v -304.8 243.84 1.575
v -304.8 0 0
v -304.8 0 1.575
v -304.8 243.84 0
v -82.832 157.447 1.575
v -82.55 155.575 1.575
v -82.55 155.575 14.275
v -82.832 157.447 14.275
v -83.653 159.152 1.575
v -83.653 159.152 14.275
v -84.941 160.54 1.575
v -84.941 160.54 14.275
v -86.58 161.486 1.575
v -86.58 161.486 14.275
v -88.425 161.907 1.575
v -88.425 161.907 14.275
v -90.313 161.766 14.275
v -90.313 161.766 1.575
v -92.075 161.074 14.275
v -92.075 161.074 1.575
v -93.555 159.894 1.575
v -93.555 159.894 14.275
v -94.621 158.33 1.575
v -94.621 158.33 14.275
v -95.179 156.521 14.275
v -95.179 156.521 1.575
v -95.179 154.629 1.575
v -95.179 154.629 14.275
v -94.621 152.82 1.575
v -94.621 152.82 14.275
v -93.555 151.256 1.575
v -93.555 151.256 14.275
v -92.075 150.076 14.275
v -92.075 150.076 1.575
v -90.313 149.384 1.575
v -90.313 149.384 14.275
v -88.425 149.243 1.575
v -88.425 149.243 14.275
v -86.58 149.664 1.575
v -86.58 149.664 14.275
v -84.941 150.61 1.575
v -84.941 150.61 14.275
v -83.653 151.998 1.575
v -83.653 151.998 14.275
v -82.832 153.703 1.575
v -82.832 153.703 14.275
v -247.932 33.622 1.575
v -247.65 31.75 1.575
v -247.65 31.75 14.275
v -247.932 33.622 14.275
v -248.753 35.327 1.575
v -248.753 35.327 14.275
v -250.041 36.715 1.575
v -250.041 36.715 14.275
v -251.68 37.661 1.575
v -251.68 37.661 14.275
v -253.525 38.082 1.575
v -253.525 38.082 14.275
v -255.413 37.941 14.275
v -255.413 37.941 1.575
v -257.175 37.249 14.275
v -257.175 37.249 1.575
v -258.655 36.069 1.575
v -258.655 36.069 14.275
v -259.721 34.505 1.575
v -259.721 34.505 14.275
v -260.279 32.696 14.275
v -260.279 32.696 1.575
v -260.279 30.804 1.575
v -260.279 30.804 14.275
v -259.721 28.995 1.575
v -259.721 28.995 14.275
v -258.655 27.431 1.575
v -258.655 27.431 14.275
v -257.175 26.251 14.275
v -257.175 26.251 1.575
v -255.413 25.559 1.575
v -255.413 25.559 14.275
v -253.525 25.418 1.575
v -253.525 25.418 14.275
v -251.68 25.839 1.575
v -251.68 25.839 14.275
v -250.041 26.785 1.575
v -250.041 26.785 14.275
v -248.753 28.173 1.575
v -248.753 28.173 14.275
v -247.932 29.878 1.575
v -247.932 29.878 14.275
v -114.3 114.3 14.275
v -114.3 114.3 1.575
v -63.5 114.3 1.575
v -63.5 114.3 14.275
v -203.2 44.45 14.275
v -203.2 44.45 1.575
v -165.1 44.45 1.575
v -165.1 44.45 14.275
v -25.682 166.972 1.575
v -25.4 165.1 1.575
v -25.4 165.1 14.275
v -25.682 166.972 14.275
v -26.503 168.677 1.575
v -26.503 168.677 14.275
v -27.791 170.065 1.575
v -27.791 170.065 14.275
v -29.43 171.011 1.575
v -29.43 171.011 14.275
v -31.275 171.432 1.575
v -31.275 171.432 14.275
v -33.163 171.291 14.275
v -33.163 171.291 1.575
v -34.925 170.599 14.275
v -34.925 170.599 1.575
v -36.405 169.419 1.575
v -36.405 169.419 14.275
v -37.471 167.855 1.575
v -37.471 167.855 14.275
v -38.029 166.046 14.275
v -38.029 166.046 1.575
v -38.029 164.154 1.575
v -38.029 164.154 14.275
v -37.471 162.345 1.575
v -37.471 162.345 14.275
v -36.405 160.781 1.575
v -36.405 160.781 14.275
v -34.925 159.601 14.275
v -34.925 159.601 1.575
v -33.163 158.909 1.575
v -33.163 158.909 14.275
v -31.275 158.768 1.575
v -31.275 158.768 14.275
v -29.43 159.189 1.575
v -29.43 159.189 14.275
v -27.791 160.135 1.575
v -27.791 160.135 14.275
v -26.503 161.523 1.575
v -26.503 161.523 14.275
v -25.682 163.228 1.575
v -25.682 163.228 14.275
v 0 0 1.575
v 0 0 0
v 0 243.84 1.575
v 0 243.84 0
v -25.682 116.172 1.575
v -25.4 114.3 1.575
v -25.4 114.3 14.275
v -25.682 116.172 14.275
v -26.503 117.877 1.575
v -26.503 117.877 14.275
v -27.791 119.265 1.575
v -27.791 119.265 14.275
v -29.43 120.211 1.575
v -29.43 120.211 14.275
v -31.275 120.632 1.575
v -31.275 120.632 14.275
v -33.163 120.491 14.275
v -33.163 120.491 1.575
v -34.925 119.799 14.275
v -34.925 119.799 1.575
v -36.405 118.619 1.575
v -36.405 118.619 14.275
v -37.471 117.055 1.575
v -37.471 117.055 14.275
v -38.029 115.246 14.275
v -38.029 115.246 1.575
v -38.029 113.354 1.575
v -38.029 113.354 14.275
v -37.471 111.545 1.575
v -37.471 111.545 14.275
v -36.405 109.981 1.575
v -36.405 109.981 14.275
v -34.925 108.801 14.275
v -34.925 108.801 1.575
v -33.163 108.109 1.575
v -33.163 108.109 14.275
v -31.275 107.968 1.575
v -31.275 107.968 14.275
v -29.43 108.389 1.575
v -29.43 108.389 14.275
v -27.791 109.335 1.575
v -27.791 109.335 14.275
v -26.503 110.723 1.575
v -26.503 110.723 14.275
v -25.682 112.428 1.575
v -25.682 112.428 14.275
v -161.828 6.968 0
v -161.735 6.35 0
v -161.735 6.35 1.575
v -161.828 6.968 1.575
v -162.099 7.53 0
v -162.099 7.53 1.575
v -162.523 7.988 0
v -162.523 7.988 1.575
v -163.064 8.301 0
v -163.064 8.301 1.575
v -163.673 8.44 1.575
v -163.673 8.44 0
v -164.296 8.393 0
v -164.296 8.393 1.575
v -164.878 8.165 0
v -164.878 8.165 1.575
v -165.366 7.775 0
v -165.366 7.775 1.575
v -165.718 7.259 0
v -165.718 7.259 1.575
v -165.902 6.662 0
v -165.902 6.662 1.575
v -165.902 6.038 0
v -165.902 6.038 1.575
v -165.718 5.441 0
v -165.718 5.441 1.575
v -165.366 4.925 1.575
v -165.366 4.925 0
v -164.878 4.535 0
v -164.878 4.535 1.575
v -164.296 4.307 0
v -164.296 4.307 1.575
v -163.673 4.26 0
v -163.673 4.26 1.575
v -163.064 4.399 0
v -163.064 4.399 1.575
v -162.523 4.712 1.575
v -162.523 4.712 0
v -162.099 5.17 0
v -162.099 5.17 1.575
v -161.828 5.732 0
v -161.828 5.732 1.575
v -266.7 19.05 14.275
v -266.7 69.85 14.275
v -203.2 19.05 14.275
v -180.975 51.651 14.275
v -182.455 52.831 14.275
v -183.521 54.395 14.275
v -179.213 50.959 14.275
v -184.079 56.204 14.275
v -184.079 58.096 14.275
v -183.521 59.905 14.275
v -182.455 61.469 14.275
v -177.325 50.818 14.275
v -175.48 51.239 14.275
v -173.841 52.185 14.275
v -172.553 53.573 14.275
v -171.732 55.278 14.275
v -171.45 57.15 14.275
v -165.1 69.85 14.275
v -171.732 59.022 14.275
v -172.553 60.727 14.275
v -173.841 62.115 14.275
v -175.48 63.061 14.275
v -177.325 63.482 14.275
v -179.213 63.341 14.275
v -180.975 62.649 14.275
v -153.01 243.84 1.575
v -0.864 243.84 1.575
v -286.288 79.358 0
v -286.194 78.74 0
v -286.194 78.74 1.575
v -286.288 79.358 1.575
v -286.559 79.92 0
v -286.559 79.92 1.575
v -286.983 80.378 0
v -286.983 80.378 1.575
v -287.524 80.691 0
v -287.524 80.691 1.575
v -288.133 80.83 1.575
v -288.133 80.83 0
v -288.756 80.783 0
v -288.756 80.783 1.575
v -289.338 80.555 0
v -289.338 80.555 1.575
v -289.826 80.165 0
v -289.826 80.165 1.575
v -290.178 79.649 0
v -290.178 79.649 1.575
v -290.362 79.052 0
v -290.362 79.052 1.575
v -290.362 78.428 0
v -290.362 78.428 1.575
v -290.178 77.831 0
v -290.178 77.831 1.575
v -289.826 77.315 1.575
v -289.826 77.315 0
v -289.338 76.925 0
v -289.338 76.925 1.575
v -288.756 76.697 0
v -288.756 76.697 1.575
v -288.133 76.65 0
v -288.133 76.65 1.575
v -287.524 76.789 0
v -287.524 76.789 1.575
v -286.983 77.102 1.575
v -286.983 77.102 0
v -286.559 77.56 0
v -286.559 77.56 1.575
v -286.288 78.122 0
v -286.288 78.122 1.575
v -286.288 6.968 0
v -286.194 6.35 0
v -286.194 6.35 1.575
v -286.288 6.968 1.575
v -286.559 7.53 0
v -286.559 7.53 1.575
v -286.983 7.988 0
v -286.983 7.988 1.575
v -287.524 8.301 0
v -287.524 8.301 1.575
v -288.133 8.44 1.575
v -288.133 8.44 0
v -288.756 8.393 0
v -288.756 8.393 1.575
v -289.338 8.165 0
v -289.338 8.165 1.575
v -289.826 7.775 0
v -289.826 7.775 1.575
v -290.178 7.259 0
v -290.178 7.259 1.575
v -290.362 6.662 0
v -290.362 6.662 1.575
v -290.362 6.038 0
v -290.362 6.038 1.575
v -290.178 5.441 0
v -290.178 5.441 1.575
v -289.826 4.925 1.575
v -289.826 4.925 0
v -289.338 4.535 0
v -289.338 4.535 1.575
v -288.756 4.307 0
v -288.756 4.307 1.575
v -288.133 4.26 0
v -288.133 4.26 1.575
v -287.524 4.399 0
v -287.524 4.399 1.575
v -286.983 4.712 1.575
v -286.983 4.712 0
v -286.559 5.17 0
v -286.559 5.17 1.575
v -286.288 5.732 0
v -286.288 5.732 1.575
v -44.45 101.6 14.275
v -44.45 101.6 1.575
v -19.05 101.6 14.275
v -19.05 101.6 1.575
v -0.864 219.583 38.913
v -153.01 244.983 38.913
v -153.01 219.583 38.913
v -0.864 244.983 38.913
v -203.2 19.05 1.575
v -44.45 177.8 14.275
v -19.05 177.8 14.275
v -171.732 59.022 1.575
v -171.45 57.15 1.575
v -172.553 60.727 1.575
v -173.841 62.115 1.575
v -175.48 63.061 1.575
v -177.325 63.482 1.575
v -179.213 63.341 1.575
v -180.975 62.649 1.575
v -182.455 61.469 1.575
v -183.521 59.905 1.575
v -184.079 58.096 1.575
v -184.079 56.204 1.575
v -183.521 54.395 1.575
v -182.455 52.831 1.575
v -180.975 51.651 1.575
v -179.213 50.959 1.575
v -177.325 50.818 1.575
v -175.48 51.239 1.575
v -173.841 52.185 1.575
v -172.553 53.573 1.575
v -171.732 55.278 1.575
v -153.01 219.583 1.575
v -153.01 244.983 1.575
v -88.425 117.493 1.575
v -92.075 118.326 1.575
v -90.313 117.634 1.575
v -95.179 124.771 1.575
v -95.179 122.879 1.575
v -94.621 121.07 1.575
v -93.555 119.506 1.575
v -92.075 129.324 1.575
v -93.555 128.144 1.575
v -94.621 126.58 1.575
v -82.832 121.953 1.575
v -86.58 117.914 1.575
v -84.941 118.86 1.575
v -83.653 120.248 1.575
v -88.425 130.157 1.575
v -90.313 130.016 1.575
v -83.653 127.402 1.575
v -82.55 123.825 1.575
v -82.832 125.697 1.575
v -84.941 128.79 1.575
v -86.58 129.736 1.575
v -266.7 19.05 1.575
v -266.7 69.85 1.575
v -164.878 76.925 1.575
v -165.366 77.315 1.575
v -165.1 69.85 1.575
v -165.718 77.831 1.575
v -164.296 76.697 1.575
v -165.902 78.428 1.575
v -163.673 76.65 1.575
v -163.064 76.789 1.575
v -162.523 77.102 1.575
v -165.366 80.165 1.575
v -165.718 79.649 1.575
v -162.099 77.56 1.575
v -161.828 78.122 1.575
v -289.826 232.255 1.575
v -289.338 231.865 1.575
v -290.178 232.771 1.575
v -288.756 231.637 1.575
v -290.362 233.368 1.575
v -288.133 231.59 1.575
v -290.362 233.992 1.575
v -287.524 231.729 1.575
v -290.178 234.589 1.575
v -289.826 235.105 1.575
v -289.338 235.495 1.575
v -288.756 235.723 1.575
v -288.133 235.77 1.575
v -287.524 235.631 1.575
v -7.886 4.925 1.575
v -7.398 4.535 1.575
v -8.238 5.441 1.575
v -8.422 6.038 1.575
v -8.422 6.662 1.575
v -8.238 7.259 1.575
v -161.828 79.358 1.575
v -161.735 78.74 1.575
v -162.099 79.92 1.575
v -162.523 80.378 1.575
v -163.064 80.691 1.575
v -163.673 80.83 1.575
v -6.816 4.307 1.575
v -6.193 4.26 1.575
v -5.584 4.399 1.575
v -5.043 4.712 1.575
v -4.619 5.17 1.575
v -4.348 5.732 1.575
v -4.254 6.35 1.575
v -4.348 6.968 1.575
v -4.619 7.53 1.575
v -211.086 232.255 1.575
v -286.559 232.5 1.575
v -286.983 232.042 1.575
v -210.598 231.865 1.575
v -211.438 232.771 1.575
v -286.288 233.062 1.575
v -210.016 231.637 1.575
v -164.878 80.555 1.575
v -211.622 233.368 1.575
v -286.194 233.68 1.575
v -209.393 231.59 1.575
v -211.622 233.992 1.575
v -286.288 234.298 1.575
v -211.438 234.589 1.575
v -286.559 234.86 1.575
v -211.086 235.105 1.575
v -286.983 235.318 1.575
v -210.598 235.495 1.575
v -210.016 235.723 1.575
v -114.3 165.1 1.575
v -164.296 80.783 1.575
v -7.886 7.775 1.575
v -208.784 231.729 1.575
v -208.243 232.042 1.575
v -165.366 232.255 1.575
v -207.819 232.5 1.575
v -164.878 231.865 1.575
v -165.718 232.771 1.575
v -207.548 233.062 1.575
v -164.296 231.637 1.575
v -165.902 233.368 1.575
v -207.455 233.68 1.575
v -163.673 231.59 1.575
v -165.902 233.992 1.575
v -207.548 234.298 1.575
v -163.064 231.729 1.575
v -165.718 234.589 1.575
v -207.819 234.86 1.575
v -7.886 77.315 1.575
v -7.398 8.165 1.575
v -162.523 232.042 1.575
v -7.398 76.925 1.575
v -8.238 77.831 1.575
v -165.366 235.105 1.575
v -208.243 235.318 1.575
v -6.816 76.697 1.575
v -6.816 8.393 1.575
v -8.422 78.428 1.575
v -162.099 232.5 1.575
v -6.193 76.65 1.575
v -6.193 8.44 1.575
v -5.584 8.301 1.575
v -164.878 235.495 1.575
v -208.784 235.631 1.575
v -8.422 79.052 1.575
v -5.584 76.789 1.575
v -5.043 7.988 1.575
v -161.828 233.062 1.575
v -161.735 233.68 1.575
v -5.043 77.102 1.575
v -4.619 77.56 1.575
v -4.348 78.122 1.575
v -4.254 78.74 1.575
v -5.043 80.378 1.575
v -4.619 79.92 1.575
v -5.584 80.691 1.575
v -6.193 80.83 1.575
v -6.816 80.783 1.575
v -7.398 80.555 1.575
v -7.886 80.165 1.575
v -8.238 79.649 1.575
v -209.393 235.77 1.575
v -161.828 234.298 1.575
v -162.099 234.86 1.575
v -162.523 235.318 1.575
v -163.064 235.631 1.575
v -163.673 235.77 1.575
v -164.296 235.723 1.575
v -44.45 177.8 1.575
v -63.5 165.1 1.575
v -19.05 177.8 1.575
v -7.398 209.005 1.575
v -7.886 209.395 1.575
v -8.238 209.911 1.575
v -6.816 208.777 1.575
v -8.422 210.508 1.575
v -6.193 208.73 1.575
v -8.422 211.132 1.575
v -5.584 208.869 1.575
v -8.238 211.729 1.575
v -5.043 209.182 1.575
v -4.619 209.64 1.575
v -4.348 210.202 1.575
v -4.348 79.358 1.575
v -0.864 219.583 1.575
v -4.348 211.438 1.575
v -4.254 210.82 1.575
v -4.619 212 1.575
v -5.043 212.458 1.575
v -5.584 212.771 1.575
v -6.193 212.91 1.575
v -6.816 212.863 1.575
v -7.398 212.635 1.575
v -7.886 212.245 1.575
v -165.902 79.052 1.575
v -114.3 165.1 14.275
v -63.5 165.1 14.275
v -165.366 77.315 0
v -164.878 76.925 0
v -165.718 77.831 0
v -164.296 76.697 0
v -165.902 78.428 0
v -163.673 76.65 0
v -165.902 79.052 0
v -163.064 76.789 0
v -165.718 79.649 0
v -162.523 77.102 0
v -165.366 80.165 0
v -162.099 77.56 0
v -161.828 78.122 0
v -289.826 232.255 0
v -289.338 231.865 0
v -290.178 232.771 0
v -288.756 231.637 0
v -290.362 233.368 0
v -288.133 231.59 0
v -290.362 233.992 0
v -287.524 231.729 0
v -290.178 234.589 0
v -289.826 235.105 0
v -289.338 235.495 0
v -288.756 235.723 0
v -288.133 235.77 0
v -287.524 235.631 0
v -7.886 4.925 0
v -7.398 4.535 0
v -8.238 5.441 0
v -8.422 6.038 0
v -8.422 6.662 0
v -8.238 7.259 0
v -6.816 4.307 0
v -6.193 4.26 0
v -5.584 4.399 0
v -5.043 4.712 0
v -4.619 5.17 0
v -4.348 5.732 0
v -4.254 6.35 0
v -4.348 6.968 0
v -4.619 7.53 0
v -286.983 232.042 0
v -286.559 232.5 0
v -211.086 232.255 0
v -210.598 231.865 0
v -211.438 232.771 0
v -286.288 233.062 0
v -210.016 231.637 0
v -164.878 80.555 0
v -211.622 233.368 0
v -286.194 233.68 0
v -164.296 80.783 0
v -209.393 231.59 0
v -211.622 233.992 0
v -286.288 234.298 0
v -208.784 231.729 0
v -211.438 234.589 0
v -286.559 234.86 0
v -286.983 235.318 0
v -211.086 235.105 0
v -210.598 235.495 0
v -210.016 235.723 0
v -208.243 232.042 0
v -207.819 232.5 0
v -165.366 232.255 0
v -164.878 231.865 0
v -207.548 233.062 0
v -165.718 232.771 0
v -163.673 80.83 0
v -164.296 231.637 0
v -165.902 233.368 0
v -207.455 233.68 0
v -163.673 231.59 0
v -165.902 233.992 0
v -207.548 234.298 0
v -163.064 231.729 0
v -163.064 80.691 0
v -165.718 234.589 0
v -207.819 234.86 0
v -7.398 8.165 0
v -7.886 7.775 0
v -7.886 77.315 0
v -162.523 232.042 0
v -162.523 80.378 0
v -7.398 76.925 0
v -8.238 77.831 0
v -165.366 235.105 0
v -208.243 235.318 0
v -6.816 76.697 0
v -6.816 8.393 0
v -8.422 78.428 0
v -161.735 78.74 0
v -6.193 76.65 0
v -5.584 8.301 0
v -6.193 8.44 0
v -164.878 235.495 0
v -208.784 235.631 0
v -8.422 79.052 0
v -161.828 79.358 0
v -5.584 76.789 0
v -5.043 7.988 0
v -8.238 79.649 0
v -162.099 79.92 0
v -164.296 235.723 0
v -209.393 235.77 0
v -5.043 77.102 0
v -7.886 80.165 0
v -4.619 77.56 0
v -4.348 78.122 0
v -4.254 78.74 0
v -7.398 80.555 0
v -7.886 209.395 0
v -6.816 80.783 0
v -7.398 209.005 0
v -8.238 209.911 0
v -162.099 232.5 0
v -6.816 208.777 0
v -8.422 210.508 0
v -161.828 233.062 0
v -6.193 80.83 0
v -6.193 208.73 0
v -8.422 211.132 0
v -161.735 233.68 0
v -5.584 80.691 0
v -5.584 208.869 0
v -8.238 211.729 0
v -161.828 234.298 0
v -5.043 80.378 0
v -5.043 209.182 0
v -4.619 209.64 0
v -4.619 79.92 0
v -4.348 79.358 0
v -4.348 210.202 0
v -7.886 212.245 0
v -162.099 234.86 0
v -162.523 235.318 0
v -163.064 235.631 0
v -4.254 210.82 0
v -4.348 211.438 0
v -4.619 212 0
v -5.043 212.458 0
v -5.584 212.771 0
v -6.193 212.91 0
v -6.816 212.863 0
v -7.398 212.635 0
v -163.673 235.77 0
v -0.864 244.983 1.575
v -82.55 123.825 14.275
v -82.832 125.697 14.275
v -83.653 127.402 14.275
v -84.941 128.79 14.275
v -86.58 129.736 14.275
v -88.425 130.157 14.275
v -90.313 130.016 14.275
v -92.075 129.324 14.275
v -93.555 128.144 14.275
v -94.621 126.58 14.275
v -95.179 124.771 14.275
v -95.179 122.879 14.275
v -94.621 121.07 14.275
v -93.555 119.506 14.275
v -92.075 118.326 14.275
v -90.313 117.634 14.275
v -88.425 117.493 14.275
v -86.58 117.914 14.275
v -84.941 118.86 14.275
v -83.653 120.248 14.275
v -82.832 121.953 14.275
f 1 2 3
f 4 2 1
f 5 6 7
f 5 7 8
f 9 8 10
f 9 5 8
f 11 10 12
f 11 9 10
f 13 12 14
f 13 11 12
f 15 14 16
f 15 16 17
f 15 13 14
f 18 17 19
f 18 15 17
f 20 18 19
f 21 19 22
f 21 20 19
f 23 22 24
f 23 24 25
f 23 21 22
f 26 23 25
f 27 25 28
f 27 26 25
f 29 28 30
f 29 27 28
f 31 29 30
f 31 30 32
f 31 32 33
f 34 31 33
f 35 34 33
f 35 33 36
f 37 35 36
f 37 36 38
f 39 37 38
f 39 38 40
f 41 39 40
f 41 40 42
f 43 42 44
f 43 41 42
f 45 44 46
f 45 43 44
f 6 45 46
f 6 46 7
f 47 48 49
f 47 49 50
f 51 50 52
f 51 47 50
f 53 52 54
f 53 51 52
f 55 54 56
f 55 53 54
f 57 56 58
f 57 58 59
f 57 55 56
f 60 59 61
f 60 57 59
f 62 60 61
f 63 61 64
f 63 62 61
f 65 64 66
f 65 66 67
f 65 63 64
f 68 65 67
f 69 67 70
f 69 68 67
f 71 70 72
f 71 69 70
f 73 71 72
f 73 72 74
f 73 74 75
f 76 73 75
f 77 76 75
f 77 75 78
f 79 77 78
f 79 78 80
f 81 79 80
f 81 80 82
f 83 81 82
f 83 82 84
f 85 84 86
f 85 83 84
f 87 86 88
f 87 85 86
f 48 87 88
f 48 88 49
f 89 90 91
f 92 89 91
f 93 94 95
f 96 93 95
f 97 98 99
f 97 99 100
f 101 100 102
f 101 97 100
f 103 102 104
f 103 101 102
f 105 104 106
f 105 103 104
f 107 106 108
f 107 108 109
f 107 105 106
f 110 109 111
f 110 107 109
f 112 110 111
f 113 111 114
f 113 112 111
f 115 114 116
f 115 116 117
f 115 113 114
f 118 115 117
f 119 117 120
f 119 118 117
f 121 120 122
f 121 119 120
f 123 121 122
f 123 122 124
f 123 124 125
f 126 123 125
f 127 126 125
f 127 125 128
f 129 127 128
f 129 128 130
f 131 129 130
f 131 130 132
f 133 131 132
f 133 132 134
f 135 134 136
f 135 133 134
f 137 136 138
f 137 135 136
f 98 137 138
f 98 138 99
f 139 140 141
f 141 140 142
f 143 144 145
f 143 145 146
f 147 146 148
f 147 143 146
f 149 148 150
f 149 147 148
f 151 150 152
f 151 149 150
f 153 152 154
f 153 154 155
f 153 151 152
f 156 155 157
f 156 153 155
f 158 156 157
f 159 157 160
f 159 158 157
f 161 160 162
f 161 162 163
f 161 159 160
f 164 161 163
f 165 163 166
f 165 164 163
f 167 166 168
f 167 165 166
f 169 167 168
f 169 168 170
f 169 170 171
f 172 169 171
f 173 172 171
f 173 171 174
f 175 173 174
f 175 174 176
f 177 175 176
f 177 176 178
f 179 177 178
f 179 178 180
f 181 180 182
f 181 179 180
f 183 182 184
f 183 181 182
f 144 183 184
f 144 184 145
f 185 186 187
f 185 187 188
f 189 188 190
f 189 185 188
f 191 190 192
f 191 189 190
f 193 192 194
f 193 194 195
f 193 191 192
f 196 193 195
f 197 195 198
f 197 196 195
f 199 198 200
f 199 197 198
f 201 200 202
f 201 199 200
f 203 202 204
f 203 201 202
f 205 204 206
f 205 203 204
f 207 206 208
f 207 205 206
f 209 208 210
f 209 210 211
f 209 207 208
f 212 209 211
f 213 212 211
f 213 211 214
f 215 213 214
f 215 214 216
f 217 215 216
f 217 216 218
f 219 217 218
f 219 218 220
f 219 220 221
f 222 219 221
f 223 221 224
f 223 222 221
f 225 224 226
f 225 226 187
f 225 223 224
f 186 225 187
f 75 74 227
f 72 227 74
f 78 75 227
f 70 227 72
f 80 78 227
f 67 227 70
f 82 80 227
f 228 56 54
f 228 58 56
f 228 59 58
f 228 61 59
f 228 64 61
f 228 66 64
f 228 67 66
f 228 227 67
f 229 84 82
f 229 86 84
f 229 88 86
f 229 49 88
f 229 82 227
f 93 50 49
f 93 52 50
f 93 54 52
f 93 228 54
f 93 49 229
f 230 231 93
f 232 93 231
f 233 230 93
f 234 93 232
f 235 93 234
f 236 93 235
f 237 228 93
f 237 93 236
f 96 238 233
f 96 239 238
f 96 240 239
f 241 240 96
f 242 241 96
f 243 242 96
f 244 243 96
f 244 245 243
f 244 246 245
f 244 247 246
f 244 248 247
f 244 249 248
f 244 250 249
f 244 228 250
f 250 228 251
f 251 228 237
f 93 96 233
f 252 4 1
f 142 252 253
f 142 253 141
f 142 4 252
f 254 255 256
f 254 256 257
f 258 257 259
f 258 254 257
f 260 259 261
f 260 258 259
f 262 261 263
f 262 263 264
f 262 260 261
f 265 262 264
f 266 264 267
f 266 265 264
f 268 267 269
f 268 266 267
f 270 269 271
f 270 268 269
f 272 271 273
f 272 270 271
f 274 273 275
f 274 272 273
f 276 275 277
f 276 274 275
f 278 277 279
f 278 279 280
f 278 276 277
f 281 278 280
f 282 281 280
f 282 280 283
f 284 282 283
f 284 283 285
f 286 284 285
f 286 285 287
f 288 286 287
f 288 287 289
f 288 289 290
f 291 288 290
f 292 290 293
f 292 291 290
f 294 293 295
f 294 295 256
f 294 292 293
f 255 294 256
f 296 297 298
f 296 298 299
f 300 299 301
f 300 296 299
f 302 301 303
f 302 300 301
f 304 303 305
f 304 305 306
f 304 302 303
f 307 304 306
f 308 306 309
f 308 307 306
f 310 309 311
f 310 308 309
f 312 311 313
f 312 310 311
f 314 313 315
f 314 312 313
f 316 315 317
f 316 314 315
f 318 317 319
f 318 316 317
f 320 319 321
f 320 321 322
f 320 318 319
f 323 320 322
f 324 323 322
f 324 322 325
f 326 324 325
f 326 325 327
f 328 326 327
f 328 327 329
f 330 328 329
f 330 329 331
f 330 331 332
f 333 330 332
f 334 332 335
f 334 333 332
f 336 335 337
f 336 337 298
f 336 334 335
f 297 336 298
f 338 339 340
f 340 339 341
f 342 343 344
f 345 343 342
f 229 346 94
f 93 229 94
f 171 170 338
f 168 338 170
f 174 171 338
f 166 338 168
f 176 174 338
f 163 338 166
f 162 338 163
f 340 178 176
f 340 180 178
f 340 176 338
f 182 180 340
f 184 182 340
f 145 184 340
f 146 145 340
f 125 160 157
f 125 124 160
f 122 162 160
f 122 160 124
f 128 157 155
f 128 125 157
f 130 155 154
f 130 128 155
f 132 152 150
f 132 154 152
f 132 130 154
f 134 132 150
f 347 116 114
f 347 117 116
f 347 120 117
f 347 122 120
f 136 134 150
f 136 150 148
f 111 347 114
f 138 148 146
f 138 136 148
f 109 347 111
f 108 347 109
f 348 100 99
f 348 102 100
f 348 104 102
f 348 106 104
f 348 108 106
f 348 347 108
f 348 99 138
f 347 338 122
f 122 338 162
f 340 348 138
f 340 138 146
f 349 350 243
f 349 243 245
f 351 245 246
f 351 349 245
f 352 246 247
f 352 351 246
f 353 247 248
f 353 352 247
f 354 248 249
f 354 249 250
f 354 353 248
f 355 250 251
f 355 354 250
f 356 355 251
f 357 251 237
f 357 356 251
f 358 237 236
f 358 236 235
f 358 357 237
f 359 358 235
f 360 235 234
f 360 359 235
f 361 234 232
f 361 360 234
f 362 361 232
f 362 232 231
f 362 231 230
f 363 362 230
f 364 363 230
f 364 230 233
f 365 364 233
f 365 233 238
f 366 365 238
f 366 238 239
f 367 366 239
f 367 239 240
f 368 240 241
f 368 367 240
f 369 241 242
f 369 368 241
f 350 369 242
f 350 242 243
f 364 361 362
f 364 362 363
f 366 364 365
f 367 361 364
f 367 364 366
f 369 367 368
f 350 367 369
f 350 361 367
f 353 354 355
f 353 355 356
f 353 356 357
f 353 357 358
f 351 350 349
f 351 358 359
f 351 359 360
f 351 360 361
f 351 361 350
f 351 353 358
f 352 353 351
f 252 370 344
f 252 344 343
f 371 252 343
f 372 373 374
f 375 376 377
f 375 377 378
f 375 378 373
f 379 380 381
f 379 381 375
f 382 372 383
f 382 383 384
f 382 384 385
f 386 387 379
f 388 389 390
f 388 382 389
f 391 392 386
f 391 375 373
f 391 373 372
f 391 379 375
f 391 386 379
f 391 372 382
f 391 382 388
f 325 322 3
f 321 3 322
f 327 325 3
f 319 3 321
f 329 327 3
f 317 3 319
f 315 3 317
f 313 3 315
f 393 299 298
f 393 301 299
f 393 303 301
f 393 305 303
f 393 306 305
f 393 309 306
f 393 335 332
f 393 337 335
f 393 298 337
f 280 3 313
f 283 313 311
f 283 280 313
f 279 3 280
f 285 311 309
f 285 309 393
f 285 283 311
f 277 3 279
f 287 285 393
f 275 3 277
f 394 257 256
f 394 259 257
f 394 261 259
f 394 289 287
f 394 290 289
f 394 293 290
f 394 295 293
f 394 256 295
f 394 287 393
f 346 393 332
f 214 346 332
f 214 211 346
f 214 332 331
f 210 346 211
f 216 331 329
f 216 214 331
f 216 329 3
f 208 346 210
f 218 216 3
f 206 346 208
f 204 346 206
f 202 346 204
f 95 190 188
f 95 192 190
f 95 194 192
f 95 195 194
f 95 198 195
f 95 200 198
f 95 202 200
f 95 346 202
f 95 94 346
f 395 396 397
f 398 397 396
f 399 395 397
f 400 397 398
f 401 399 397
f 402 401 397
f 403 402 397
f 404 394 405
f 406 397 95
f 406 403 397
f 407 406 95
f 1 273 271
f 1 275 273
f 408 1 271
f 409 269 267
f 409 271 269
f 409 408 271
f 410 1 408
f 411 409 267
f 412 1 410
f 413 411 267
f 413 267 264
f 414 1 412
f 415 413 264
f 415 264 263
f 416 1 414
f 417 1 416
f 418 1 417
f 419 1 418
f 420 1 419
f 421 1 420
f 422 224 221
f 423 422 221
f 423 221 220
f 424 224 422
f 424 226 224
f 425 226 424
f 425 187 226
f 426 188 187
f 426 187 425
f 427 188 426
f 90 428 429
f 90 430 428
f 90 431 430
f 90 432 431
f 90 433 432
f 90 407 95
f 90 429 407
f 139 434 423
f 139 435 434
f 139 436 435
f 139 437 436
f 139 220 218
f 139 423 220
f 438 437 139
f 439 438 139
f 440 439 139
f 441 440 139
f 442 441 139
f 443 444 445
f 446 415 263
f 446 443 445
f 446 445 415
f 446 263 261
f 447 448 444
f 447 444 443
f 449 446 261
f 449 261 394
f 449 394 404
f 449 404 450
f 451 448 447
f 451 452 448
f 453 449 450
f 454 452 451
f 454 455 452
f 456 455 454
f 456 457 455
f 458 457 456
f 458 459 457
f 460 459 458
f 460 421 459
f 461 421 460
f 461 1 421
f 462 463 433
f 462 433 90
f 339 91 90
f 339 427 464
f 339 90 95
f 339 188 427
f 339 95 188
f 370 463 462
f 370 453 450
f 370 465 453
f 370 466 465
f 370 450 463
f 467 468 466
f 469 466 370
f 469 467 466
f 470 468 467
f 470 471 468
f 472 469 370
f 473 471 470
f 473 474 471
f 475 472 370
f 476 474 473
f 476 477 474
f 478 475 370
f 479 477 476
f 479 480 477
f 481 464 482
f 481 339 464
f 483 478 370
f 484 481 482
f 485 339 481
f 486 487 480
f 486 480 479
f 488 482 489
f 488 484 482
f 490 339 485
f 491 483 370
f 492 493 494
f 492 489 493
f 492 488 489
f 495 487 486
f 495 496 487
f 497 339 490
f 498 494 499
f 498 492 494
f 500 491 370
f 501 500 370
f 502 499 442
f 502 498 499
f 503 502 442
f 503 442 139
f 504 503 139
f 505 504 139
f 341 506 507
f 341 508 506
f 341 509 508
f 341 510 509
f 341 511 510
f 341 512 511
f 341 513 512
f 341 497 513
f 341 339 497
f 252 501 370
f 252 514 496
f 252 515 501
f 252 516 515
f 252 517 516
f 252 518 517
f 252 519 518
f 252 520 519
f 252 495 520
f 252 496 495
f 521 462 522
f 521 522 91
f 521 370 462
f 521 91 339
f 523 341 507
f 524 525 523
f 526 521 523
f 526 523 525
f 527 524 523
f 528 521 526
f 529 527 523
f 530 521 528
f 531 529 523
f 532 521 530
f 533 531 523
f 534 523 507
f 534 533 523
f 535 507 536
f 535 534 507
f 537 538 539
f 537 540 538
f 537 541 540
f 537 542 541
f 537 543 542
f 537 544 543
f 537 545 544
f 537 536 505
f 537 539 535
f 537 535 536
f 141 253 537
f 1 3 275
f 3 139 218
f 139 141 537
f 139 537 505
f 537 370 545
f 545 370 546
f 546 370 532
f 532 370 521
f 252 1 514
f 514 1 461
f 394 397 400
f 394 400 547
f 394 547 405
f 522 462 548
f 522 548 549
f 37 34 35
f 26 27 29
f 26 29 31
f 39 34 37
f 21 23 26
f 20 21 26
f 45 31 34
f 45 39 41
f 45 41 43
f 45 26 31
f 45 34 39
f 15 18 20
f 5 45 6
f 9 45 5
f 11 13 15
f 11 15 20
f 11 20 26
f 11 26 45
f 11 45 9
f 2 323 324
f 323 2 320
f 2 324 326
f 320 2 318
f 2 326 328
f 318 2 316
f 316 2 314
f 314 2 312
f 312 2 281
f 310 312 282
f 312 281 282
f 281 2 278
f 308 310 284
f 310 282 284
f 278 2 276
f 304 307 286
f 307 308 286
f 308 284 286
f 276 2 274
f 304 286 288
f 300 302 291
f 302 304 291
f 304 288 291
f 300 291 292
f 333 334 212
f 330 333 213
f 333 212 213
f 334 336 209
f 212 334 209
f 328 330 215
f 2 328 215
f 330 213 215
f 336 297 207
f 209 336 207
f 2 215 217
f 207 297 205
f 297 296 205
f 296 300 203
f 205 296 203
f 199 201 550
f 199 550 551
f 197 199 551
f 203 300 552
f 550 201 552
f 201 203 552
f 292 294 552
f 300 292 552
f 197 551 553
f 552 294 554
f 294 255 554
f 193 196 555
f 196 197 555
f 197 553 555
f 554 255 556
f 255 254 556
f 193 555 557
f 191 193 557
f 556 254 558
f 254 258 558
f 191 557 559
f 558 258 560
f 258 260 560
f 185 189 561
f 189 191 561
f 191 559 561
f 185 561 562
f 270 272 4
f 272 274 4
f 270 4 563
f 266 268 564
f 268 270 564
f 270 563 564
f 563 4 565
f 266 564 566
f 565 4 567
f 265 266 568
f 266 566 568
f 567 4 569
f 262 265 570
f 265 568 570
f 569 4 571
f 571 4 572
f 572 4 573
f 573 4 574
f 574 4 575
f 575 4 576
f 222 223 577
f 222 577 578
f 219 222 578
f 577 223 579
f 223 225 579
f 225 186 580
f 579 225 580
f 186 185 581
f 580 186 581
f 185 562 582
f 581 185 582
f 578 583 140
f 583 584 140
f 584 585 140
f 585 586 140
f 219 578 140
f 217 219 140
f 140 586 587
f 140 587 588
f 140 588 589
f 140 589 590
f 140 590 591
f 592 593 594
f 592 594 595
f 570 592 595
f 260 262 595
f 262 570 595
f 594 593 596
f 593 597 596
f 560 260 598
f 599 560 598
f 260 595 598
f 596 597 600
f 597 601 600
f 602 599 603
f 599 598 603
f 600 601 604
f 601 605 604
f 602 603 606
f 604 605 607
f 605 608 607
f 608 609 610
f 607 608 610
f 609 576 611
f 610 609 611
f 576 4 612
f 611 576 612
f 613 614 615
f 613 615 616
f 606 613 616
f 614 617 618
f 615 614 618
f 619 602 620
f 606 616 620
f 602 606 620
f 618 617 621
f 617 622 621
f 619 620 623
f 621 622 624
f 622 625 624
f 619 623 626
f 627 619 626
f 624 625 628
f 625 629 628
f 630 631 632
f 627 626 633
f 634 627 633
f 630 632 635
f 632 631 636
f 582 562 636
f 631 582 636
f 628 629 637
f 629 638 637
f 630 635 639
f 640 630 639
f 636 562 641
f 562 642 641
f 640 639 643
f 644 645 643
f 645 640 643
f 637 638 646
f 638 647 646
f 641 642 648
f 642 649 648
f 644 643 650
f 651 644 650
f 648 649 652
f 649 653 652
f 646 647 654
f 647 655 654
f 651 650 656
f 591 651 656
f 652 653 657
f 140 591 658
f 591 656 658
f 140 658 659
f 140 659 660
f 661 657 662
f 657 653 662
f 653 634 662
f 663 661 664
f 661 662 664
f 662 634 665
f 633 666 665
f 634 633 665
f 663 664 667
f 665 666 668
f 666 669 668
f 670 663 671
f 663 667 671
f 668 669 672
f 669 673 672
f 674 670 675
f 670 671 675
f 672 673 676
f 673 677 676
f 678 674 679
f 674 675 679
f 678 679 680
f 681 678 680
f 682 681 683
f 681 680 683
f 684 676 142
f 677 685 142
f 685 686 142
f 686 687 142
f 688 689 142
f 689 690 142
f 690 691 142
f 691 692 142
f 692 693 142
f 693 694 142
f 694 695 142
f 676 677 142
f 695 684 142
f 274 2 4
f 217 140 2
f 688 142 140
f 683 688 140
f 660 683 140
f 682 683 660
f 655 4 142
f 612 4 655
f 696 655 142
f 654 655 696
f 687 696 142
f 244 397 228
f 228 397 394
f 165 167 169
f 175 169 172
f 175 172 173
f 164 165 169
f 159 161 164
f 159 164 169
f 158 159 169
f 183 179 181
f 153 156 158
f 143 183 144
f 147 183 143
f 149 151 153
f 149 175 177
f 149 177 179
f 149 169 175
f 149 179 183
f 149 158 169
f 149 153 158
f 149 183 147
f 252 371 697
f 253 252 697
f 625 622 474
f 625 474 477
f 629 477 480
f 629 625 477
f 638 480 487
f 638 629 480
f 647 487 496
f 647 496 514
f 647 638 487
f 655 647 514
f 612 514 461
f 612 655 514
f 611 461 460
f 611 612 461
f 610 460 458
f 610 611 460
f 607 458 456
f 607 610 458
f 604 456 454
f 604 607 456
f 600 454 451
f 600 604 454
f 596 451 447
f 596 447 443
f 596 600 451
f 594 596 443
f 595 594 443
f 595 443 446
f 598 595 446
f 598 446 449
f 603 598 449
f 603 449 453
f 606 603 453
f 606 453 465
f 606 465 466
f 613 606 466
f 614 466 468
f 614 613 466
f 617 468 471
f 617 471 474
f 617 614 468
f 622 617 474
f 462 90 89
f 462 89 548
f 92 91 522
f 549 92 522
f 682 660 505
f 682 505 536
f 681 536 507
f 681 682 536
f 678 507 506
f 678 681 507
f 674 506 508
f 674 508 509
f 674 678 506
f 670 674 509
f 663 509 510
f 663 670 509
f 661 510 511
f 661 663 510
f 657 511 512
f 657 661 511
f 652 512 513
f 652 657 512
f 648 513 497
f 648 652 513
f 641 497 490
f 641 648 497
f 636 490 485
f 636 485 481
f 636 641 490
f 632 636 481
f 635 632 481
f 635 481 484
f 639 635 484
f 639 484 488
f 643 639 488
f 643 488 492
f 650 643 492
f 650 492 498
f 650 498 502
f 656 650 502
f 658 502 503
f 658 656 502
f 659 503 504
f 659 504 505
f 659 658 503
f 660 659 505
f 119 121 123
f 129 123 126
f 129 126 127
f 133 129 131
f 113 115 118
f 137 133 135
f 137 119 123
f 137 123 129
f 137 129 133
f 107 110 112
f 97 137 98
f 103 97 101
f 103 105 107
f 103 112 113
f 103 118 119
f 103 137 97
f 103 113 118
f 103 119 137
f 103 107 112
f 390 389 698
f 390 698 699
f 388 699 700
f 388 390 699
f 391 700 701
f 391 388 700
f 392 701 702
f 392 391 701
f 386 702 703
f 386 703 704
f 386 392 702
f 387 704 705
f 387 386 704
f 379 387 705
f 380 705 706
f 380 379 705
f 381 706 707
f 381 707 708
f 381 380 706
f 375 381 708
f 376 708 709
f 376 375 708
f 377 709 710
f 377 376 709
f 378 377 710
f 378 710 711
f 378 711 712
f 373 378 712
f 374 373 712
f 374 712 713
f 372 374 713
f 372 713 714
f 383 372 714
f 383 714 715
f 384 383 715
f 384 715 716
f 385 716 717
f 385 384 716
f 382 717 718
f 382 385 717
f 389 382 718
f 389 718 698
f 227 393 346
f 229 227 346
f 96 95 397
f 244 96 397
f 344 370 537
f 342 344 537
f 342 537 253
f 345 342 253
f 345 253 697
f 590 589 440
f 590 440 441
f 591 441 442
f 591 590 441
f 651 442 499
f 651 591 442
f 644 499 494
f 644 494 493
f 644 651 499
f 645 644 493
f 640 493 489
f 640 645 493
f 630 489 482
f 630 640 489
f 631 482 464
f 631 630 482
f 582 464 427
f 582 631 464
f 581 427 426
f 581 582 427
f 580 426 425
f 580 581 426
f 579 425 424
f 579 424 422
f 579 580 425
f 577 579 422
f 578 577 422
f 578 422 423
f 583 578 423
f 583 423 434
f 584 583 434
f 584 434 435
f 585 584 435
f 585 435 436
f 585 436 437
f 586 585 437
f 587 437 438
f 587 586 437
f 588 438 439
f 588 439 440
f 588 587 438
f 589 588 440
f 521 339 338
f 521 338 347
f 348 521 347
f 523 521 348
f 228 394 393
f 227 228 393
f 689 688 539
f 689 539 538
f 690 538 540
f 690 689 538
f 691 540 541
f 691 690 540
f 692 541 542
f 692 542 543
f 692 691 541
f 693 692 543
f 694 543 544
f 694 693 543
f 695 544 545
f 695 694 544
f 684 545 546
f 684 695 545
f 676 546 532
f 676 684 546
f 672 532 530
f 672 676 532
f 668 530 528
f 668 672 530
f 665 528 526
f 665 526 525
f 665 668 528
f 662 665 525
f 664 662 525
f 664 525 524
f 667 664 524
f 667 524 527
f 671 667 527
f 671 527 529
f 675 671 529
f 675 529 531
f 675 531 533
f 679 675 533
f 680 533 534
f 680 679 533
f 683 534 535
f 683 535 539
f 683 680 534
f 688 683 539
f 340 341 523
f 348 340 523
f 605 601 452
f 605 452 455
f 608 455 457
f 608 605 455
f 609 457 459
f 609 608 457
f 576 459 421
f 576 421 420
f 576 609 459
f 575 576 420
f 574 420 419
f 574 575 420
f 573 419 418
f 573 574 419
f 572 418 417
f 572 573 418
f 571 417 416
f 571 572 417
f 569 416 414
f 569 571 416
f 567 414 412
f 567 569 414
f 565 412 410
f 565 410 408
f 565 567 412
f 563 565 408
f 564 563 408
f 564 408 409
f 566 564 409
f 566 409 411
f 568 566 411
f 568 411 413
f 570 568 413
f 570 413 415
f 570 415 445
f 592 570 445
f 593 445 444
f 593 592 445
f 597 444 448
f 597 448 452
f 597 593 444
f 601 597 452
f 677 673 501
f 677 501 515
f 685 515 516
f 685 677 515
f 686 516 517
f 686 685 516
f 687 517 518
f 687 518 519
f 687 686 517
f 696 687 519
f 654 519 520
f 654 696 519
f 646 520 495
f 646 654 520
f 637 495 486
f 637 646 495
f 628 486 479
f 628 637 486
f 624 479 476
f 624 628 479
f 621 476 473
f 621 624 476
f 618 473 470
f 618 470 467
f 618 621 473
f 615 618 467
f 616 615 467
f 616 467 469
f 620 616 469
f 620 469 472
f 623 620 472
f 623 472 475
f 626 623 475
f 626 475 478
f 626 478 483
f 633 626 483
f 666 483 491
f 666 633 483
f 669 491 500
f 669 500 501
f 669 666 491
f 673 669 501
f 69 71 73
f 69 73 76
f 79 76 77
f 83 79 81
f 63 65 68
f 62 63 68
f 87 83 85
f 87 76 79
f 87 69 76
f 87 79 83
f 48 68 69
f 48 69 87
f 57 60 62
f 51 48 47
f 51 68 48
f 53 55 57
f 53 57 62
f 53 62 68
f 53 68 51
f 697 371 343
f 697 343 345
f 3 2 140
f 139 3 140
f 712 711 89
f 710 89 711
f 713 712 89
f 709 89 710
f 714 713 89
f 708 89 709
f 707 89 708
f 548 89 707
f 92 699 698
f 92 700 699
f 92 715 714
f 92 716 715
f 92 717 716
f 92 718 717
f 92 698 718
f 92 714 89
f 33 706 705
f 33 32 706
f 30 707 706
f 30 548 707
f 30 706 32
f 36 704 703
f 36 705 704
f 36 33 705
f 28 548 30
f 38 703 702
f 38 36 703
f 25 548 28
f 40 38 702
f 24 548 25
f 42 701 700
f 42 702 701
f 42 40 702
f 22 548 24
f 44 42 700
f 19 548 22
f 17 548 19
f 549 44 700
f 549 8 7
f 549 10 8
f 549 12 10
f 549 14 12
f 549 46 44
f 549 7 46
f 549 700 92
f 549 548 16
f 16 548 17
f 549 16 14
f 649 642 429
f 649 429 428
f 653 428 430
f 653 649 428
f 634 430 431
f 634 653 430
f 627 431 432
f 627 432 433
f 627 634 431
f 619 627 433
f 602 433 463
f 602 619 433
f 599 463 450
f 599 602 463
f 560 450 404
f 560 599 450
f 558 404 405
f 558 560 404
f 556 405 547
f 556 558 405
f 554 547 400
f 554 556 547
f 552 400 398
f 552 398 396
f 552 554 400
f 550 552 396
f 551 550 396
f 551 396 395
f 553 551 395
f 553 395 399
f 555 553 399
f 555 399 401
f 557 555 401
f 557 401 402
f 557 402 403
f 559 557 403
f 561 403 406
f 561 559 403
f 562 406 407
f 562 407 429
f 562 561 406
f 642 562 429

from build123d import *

# Parameters (mm, degrees)
F0_W     = 304.8
F0_H     = 243.84
F0_R     = 2.0955
F1_DEPTH = 1.5748
F2_W     = 152.146
F2_H     = 25.4
F3_DEPTH = 37.338
F4_W     = 50.8
F4_H     = 50.8
F4_R     = 6.35
F5_DEPTH = 12.7
F6_W     = 25.4
F6_H     = 76.2
F6_R     = 6.35
F7_DEPTH = 12.7
F8_R     = 6.35
F9_DEPTH = 12.7


with BuildPart() as f1:
    # F0 (on Top) → F1 (new body)
    with BuildSketch(Plane.XY):
        with Locations((-152.4, 121.92)):
            Rectangle(F0_W, F0_H)
        with Locations((-288.29, 6.35)):
            Circle(F0_R, mode=Mode.SUBTRACT)
        with Locations((-163.83, 6.35)):
            Circle(F0_R, mode=Mode.SUBTRACT)
        with Locations((-288.29, 78.74)):
            Circle(F0_R, mode=Mode.SUBTRACT)
        with Locations((-163.83, 78.74)):
            Circle(F0_R, mode=Mode.SUBTRACT)
        with Locations((-6.35, 6.35)):
            Circle(F0_R, mode=Mode.SUBTRACT)
        with Locations((-6.35, 78.74)):
            Circle(F0_R, mode=Mode.SUBTRACT)
        with Locations((-288.29, 233.68)):
            Circle(F0_R, mode=Mode.SUBTRACT)
        with Locations((-209.55, 233.68)):
            Circle(F0_R, mode=Mode.SUBTRACT)
        with Locations((-163.83, 233.68)):
            Circle(F0_R, mode=Mode.SUBTRACT)
        with Locations((-6.35, 210.82)):
            Circle(F0_R, mode=Mode.SUBTRACT)
    extrude(amount=F1_DEPTH)

    # F2 (on face) → F3 (join)
    with BuildSketch(Plane.XY.offset(1.5748)):
        with Locations((-76.9366, 232.283)):
            Rectangle(F2_W, F2_H)
    extrude(amount=F3_DEPTH)

    # F4 (on face) → F5 (join)
    with BuildSketch(Plane.XY.offset(1.5748)):
        with Locations((-88.9, 139.7)):
            Rectangle(F4_W, F4_H)
        with Locations((-88.9, 123.825)):
            Circle(F4_R, mode=Mode.SUBTRACT)
        with Locations((-88.9, 155.575)):
            Circle(F4_R, mode=Mode.SUBTRACT)
    extrude(amount=F5_DEPTH)

    # F6 (on face) → F7 (join)
    with BuildSketch(Plane.XY.offset(1.5748)):
        with Locations((-31.75, 139.7)):
            Rectangle(F6_W, F6_H)
        with Locations((-31.75, 114.3)):
            Circle(F6_R, mode=Mode.SUBTRACT)
        with Locations((-31.75, 165.1)):
            Circle(F6_R, mode=Mode.SUBTRACT)
    extrude(amount=F7_DEPTH)

    # F8 (on face) → F9 (join)
    with BuildSketch(Plane.XY.offset(1.5748)):
        Polygon((-165.1, 69.85), (-266.7, 69.85), (-266.7, 19.05), (-203.2, 19.05), (-203.2, 44.45), (-165.1, 44.45), align=None)
        with Locations((-254, 31.75)):
            Circle(F8_R, mode=Mode.SUBTRACT)
        with Locations((-177.8, 57.15)):
            Circle(F8_R, mode=Mode.SUBTRACT)
    extrude(amount=F9_DEPTH)


solid = f1.part
